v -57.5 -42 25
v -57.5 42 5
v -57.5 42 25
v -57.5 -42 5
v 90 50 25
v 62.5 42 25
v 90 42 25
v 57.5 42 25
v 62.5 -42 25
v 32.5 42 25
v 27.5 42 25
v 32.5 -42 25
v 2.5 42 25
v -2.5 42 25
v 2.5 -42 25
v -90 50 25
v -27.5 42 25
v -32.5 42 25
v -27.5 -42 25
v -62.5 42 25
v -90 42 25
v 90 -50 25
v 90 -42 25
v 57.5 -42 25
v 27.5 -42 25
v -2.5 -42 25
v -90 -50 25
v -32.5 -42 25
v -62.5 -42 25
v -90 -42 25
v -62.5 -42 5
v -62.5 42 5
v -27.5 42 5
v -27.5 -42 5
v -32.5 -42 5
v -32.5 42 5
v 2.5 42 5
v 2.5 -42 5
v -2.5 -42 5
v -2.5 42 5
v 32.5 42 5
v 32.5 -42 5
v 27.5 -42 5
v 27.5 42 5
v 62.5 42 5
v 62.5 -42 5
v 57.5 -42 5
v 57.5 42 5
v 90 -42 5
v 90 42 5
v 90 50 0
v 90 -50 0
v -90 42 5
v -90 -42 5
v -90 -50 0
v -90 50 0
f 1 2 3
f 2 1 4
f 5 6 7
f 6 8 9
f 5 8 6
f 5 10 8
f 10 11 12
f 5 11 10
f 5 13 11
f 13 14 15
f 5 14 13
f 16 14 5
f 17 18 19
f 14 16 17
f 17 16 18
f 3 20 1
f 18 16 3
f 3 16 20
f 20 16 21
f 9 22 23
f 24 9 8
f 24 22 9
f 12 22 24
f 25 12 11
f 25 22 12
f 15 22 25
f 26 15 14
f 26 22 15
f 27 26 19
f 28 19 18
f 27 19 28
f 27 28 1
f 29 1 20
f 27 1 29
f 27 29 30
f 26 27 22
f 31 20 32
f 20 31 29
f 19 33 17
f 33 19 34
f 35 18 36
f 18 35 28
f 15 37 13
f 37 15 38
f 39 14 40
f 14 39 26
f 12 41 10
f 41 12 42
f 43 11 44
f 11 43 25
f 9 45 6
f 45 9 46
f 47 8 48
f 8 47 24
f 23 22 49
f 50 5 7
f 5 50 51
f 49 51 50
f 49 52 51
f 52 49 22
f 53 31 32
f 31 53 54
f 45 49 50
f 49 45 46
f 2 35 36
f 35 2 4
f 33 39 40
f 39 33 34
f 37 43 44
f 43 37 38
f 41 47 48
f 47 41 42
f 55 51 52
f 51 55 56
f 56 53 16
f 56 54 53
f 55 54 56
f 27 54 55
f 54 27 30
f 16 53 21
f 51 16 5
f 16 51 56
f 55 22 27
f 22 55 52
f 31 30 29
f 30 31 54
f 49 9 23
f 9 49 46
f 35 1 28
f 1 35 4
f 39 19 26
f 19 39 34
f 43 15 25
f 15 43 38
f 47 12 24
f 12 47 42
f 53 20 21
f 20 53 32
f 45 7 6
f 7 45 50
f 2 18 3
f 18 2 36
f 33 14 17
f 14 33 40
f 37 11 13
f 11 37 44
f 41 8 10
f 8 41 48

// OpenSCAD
$fn = 32;

// ----------------------------------------------------------------------
// Rib frame 180 x 100 x 25
// 5 ribs at 30 mm pitch
// ----------------------------------------------------------------------

// --- parameters (mm) ---
frame = [180, 100, 5];  // base plate size (x, y, z)
rail_w = 8;             // side rail width
ribs = 5;               // number of ribs
rib_t = 5;              // rib thickness
rib_h = 20;             // rib height above the base plate
pitch = 30;             // pitch between rib centres

// --- derived feature positions (mm) ---
span = (ribs - 1) * pitch;          // = 120   distance between the outer ribs
origin_x = -span / 2;               // = -60   X of the first rib
rib_len = frame[1] - 2 * rail_w + 2;  // = 86   rib length, 1 mm into each rail
feature_centers = [
  [origin_x + 0 * pitch, 0],
  [origin_x + 1 * pitch, 0],
  [origin_x + 2 * pitch, 0],
  [origin_x + 3 * pitch, 0],
  [origin_x + 4 * pitch, 0]
];   // rib centre line, drives the rib loop

// base plate, two side rails, then the ribs read straight off feature_centers
union() {
  translate([-frame[0] / 2, -frame[1] / 2, 0]) cube(frame);
  translate([-frame[0] / 2, -frame[1] / 2, 0]) cube([frame[0], rail_w, frame[2] + rib_h]);
  translate([-frame[0] / 2, frame[1] / 2 - rail_w, 0]) cube([frame[0], rail_w, frame[2] + rib_h]);
  for (centre = feature_centers)
    translate([centre[0] - rib_t / 2, centre[1] - rib_len / 2, frame[2] - 1])
      cube([rib_t, rib_len, rib_h + 1]);
}
